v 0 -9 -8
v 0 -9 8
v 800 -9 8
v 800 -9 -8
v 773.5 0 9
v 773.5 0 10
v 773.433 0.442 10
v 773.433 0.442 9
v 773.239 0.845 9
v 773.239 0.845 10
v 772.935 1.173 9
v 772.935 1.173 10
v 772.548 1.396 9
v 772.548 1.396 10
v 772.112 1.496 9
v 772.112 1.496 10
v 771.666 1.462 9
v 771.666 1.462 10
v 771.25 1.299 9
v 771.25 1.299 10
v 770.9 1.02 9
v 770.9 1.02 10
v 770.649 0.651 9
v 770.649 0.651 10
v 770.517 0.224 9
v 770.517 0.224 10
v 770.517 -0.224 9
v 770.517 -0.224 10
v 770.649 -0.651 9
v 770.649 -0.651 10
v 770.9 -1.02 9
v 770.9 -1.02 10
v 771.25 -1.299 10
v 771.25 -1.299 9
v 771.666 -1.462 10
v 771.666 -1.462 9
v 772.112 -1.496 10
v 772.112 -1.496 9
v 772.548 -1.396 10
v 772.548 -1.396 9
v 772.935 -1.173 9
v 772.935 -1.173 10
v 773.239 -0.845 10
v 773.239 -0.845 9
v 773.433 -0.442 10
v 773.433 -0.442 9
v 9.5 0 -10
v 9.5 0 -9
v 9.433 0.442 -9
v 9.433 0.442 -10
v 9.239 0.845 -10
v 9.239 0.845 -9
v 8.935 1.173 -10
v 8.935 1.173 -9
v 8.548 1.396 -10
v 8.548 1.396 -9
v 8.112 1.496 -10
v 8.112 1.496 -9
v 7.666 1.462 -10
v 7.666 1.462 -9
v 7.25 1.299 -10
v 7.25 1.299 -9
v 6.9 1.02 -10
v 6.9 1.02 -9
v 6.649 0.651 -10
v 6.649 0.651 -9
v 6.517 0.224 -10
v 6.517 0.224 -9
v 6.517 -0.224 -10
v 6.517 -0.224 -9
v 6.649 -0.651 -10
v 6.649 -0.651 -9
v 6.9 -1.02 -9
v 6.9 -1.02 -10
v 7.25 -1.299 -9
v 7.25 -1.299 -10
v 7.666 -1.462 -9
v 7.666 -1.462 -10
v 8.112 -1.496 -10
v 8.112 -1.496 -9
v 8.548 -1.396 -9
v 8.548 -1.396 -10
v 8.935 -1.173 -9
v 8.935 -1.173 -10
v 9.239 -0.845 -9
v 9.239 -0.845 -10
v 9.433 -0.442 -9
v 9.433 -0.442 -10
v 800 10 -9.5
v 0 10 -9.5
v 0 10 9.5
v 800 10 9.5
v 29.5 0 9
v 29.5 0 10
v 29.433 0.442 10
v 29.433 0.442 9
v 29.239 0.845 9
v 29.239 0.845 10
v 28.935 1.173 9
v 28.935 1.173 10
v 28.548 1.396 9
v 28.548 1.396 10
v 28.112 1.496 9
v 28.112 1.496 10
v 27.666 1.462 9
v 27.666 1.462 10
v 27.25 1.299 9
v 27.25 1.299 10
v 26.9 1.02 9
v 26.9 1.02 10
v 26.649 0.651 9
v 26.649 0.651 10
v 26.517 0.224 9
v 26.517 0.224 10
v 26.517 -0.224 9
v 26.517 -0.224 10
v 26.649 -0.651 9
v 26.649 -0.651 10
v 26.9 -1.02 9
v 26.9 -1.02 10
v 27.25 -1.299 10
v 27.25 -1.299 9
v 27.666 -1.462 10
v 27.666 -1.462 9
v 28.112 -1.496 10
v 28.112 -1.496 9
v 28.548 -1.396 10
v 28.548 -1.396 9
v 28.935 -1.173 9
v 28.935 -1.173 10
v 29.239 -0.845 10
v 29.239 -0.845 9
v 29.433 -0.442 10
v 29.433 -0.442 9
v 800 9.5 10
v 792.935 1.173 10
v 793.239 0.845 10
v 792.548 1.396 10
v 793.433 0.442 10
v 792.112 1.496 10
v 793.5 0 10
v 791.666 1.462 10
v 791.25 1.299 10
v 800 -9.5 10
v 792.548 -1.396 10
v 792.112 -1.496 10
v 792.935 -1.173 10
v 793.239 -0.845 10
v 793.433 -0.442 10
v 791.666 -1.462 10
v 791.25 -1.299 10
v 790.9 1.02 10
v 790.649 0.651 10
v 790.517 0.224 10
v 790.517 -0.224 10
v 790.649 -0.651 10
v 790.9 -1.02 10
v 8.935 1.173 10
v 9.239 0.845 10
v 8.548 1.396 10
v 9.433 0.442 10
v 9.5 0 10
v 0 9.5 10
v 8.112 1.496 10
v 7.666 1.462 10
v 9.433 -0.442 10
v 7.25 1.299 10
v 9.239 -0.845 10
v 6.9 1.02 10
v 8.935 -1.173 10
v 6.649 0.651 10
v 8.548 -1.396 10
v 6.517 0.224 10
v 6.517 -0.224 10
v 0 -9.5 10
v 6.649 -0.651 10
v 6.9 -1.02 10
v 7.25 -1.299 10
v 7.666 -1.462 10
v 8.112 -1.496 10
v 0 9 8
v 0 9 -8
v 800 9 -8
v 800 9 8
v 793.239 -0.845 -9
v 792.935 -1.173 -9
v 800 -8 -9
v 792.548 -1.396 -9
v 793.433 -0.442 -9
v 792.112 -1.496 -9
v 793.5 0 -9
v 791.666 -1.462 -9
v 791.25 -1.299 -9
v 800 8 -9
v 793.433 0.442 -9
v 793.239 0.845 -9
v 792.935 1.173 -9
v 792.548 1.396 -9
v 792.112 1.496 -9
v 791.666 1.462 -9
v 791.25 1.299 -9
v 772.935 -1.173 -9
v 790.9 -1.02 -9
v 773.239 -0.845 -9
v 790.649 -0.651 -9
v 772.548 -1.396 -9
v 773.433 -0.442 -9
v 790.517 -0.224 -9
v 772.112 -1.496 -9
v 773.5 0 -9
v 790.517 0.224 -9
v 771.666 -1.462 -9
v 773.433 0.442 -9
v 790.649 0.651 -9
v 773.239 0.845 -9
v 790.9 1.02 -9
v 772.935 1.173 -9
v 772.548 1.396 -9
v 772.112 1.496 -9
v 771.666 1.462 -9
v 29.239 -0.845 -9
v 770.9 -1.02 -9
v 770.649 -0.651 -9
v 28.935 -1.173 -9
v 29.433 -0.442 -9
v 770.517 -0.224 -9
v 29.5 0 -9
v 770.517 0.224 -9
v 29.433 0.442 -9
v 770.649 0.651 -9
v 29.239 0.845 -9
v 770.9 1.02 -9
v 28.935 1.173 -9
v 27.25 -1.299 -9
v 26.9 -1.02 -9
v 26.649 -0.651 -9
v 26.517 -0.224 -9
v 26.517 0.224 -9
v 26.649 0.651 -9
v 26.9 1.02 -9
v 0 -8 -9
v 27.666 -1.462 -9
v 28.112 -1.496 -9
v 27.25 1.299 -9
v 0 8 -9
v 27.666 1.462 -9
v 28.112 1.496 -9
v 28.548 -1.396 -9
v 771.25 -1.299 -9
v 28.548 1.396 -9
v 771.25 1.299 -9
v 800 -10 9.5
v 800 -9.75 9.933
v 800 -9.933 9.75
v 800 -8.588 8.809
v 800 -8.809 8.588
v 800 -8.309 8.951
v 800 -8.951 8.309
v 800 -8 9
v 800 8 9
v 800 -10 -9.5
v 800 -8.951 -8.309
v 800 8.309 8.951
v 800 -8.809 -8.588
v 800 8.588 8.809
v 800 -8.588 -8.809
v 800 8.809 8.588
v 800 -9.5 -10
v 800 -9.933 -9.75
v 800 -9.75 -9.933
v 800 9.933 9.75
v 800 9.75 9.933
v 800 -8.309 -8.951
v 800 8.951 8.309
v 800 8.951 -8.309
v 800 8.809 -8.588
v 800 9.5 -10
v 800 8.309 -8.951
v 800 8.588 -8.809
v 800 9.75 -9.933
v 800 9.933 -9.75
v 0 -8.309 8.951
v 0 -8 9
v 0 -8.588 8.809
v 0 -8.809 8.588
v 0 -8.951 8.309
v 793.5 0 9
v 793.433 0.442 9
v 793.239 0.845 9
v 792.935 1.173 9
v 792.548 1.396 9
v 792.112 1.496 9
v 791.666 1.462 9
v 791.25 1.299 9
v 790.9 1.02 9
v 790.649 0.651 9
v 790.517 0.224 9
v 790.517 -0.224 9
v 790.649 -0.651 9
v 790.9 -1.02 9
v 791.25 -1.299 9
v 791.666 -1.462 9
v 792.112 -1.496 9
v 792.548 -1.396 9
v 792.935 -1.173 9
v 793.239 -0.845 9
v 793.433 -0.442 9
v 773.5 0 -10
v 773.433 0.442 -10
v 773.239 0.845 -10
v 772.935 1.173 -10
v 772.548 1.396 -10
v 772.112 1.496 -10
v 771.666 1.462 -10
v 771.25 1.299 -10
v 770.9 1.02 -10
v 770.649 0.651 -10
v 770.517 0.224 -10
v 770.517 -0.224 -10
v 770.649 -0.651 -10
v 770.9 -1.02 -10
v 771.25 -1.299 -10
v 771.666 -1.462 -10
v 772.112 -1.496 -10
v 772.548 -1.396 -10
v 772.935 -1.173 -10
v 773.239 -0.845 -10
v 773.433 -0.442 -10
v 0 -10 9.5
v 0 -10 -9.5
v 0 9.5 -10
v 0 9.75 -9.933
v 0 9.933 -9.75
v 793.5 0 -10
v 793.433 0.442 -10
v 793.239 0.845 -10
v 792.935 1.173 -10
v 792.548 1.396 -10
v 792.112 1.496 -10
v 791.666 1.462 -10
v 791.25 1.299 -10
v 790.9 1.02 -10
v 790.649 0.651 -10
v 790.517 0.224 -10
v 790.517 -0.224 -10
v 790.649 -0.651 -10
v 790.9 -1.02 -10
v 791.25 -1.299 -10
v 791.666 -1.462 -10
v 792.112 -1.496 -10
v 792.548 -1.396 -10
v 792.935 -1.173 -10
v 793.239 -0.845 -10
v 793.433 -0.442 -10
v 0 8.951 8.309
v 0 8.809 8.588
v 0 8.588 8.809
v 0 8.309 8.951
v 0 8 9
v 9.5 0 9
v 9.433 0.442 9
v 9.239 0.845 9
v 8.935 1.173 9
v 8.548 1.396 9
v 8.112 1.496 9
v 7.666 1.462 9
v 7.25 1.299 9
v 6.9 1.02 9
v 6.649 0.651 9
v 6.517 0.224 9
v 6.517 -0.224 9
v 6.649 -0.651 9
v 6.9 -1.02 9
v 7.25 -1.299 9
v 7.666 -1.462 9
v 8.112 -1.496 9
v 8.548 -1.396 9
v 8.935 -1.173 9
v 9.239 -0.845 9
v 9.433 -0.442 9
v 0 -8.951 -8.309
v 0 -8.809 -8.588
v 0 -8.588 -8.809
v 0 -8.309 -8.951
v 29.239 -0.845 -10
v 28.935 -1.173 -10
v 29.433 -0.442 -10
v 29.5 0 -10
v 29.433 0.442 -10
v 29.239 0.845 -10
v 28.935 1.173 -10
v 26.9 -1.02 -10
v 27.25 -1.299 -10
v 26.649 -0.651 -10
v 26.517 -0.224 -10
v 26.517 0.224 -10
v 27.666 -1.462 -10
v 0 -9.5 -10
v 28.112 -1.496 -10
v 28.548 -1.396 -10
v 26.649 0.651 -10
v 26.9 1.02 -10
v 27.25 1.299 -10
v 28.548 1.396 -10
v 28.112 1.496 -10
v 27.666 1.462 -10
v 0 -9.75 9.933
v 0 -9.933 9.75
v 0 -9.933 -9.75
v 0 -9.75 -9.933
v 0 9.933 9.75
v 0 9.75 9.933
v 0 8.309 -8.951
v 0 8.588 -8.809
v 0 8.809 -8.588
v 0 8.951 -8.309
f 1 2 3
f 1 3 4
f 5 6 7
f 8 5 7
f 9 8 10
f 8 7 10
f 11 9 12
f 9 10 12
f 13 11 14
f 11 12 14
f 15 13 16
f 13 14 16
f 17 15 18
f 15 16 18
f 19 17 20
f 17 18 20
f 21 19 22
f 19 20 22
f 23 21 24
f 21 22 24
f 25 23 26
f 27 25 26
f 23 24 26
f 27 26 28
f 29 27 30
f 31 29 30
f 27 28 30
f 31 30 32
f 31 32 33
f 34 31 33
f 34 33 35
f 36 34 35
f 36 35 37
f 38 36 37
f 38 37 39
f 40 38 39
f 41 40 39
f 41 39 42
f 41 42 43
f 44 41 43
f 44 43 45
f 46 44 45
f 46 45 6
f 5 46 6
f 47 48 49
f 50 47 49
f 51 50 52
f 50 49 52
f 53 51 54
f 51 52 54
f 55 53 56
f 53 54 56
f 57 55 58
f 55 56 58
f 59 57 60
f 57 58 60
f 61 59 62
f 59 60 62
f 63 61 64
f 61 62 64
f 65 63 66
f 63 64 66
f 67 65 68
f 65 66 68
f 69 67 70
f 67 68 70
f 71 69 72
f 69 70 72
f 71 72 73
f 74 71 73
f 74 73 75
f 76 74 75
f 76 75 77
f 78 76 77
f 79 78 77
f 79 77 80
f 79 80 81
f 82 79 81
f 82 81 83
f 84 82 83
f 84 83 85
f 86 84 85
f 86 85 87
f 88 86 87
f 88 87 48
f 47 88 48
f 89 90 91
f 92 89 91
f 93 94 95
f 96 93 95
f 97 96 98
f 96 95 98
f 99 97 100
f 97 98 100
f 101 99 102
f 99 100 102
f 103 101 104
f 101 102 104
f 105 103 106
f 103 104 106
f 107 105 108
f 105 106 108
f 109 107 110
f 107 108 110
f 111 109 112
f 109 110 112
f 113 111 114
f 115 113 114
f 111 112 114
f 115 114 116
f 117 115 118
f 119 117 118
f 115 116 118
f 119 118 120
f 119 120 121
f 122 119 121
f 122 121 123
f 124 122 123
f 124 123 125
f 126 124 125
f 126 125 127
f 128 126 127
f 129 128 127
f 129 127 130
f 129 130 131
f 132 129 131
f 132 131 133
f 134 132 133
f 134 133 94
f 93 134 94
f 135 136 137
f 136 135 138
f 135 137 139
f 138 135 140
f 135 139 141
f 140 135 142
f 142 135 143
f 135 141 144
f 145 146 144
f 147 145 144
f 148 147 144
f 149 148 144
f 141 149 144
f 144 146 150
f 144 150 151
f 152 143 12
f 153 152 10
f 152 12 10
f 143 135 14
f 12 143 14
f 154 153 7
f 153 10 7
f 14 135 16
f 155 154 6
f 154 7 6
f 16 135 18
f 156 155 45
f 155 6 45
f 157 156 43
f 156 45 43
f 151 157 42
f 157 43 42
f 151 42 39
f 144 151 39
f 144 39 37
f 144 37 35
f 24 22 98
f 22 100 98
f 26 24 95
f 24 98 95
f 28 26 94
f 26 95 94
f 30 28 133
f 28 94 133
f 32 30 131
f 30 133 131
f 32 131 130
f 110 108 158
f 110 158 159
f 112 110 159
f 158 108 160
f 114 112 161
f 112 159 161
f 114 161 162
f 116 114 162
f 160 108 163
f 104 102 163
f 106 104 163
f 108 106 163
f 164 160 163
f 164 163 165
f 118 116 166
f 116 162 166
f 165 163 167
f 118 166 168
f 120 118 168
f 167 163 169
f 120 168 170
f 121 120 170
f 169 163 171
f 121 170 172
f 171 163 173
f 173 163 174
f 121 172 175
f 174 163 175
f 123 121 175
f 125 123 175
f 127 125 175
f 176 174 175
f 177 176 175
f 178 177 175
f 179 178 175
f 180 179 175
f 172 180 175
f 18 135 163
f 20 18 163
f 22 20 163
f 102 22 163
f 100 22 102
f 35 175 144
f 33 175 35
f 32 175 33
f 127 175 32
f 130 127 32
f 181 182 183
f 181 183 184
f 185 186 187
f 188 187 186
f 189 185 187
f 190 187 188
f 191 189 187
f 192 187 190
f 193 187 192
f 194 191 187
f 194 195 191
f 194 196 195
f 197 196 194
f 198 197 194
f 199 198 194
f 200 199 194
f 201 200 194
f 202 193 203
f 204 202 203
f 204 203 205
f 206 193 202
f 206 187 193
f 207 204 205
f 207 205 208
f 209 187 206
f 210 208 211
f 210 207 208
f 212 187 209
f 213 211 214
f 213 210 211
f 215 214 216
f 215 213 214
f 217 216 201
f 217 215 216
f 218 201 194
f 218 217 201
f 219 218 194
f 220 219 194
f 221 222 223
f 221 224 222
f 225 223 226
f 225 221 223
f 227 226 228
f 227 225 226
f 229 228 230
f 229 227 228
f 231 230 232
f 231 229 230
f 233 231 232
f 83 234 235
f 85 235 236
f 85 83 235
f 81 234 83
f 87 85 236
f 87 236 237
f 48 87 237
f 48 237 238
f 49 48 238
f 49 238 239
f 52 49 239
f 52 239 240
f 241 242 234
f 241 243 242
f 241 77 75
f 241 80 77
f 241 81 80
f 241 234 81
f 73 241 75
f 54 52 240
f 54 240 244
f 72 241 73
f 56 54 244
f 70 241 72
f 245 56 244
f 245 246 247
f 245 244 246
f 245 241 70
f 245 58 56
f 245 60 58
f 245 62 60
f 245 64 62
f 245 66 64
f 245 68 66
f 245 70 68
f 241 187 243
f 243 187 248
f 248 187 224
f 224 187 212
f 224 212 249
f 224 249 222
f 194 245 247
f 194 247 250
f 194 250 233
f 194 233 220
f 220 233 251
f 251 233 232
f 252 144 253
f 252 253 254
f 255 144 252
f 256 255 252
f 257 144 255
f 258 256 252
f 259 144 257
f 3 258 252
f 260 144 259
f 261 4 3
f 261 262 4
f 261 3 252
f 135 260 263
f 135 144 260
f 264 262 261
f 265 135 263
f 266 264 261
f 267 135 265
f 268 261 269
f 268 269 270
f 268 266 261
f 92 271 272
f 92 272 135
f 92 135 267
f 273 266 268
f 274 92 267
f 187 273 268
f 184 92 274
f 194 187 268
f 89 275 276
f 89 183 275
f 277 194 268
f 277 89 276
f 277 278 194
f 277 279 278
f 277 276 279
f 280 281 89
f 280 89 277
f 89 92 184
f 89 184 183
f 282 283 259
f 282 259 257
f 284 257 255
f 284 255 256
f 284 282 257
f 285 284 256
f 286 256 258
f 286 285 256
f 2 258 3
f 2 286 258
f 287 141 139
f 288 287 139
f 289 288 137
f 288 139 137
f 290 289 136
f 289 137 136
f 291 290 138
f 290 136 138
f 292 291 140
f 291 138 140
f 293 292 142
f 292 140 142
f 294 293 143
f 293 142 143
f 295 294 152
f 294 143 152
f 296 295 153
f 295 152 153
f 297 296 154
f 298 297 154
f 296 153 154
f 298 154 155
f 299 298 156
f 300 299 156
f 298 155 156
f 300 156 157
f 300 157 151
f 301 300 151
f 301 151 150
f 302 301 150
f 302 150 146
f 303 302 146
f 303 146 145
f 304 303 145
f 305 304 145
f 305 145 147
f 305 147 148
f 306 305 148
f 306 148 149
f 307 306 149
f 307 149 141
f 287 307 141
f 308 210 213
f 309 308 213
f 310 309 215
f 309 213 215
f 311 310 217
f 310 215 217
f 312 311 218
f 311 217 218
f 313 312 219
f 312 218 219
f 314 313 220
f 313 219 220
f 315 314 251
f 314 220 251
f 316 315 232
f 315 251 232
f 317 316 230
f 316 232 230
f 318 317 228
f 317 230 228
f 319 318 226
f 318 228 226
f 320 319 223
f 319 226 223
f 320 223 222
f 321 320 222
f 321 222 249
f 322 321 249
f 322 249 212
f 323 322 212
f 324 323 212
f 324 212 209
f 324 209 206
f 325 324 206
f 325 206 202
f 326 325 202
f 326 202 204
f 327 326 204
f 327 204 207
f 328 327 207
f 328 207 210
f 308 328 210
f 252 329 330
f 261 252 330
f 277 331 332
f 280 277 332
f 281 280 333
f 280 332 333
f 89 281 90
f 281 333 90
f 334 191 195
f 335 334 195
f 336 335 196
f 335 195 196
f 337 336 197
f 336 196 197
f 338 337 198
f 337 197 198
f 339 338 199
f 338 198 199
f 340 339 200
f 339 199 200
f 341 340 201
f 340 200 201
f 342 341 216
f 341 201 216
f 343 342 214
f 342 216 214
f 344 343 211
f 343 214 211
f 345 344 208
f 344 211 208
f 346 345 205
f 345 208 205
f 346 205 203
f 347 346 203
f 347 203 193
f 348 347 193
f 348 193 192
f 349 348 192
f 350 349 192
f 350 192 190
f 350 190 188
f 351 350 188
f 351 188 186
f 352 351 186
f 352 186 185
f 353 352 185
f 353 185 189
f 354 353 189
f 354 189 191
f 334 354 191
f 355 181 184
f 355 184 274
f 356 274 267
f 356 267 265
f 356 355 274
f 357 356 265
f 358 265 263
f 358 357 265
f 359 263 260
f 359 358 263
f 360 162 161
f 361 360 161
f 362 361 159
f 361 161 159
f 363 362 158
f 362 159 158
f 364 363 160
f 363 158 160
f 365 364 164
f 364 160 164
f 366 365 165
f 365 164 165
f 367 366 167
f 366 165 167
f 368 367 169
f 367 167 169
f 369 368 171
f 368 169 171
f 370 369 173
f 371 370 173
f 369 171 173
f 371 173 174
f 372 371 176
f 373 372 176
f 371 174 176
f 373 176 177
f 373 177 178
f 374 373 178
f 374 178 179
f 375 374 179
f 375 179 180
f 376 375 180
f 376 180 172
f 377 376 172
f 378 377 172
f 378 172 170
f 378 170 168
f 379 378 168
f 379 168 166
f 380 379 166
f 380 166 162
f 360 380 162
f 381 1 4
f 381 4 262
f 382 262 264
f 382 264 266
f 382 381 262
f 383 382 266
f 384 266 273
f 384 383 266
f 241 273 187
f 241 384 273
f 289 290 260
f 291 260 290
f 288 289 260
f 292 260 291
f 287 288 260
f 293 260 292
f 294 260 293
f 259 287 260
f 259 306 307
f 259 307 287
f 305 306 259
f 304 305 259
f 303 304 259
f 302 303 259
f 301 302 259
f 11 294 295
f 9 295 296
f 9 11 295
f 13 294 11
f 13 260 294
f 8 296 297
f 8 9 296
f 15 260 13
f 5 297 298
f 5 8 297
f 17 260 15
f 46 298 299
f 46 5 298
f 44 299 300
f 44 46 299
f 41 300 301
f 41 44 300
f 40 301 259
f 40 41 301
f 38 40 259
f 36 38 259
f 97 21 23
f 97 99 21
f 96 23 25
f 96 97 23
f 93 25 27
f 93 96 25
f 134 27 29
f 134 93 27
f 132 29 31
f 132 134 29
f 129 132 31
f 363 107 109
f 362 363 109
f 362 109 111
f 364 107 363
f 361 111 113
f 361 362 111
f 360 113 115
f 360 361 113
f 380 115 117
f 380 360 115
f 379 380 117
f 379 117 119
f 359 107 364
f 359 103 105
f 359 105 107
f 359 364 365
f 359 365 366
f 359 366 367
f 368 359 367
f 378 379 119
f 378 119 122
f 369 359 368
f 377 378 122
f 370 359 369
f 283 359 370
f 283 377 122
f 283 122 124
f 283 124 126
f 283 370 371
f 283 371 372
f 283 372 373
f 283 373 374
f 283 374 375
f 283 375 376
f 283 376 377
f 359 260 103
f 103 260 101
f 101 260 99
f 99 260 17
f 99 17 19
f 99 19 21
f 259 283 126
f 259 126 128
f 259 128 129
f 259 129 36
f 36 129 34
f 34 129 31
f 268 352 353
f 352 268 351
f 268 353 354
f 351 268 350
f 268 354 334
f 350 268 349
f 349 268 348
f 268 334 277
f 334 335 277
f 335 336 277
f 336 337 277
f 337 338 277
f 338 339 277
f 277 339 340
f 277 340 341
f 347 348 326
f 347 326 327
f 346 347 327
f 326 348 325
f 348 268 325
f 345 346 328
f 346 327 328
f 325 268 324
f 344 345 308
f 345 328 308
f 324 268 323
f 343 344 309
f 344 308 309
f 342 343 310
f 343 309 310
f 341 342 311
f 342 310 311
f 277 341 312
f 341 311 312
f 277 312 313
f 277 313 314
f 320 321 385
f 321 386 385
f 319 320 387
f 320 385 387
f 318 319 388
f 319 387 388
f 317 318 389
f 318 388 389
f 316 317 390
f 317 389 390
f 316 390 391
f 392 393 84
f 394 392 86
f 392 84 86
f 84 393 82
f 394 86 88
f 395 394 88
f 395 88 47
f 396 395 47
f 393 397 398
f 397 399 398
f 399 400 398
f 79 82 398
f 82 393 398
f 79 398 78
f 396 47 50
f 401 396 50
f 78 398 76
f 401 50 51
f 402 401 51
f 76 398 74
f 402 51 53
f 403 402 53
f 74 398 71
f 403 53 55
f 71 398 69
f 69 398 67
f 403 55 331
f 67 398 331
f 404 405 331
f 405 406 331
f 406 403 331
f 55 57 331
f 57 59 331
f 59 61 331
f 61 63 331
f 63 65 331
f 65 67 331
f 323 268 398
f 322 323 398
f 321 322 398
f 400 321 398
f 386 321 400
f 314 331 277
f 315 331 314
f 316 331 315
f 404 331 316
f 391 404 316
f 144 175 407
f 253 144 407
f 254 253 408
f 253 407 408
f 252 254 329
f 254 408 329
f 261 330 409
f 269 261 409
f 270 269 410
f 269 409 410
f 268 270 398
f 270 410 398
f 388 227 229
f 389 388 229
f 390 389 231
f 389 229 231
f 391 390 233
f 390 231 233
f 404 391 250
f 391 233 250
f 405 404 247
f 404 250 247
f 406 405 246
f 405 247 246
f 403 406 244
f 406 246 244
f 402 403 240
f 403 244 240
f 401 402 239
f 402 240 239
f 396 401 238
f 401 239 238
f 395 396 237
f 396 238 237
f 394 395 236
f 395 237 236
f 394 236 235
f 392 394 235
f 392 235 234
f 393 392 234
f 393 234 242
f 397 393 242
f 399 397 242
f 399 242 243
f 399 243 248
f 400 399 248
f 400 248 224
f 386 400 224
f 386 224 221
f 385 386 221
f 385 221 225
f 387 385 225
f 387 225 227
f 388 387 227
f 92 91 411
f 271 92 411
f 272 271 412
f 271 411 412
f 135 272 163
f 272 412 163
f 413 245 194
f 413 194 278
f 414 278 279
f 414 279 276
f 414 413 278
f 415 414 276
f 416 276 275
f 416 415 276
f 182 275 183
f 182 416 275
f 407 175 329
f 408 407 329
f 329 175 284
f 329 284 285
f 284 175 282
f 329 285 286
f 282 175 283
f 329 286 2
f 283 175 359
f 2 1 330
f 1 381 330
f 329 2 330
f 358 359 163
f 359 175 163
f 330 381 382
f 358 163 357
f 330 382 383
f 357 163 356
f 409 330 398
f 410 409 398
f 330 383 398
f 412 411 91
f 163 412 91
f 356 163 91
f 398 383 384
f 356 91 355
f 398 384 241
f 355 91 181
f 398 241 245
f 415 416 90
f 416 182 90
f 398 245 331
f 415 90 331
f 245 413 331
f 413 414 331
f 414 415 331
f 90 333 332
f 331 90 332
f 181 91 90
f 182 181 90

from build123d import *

# Parameters (mm, degrees)
BOSS_EXTRUDE1_DEPTH = 800
SKETCH2_R           = 1.5
CUT_EXTRUDE1_DEPTH  = 205
SKETCH3_R           = 1.5
CUT_EXTRUDE2_DEPTH  = 25


with BuildPart() as part:
    # Sketch1 → Boss-Extrude1 (new body)
    with BuildSketch(Plane(origin=(0, 0, 0), x_dir=(0, 0, -1), z_dir=(1, 0, 0))):
        with BuildLine():
            Line((-9.5, -10), (9.5, -10))
            ThreePointArc((9.5, -10), (9.853553391, -9.853553391), (10, -9.5))
            Line((10, -9.5), (10, 9.5))
            ThreePointArc((10, 9.5), (9.853553391, 9.853553391), (9.5, 10))
            Line((9.5, 10), (-9.5, 10))
            ThreePointArc((-9.5, 10), (-9.853553391, 9.853553391), (-10, 9.5))
            Line((-10, 9.5), (-10, -9.5))
            ThreePointArc((-10, -9.5), (-9.853553391, -9.853553391), (-9.5, -10))
        make_face()
        with BuildLine():
            Line((-8, -9), (8, -9))
            ThreePointArc((8, -9), (8.707106781, -8.707106781), (9, -8))
            Line((9, -8), (9, 8))
            ThreePointArc((9, 8), (8.707106781, 8.707106781), (8, 9))
            Line((8, 9), (-8, 9))
            ThreePointArc((-8, 9), (-8.707106781, 8.707106781), (-9, 8))
            Line((-9, 8), (-9, -8))
            ThreePointArc((-9, -8), (-8.707106781, -8.707106781), (-8, -9))
        make_face(mode=Mode.SUBTRACT)
    extrude(amount=BOSS_EXTRUDE1_DEPTH)

    # Sketch2 → Cut-Extrude1 (cut)
    with BuildSketch(Plane.XY.offset(10)):
        with Locations((792, 0)):
            Circle(SKETCH2_R)
        with Locations((772, 0)):
            Circle(SKETCH2_R)
    extrude(amount=-CUT_EXTRUDE1_DEPTH, mode=Mode.SUBTRACT)

    # Sketch3 → Cut-Extrude2 (cut)
    with BuildSketch(Plane.XY.offset(10)):
        with Locations((8, 0)):
            Circle(SKETCH3_R)
        with Locations((28, 0)):
            Circle(SKETCH3_R)
    extrude(amount=-CUT_EXTRUDE2_DEPTH, mode=Mode.SUBTRACT)


solid = part.part
